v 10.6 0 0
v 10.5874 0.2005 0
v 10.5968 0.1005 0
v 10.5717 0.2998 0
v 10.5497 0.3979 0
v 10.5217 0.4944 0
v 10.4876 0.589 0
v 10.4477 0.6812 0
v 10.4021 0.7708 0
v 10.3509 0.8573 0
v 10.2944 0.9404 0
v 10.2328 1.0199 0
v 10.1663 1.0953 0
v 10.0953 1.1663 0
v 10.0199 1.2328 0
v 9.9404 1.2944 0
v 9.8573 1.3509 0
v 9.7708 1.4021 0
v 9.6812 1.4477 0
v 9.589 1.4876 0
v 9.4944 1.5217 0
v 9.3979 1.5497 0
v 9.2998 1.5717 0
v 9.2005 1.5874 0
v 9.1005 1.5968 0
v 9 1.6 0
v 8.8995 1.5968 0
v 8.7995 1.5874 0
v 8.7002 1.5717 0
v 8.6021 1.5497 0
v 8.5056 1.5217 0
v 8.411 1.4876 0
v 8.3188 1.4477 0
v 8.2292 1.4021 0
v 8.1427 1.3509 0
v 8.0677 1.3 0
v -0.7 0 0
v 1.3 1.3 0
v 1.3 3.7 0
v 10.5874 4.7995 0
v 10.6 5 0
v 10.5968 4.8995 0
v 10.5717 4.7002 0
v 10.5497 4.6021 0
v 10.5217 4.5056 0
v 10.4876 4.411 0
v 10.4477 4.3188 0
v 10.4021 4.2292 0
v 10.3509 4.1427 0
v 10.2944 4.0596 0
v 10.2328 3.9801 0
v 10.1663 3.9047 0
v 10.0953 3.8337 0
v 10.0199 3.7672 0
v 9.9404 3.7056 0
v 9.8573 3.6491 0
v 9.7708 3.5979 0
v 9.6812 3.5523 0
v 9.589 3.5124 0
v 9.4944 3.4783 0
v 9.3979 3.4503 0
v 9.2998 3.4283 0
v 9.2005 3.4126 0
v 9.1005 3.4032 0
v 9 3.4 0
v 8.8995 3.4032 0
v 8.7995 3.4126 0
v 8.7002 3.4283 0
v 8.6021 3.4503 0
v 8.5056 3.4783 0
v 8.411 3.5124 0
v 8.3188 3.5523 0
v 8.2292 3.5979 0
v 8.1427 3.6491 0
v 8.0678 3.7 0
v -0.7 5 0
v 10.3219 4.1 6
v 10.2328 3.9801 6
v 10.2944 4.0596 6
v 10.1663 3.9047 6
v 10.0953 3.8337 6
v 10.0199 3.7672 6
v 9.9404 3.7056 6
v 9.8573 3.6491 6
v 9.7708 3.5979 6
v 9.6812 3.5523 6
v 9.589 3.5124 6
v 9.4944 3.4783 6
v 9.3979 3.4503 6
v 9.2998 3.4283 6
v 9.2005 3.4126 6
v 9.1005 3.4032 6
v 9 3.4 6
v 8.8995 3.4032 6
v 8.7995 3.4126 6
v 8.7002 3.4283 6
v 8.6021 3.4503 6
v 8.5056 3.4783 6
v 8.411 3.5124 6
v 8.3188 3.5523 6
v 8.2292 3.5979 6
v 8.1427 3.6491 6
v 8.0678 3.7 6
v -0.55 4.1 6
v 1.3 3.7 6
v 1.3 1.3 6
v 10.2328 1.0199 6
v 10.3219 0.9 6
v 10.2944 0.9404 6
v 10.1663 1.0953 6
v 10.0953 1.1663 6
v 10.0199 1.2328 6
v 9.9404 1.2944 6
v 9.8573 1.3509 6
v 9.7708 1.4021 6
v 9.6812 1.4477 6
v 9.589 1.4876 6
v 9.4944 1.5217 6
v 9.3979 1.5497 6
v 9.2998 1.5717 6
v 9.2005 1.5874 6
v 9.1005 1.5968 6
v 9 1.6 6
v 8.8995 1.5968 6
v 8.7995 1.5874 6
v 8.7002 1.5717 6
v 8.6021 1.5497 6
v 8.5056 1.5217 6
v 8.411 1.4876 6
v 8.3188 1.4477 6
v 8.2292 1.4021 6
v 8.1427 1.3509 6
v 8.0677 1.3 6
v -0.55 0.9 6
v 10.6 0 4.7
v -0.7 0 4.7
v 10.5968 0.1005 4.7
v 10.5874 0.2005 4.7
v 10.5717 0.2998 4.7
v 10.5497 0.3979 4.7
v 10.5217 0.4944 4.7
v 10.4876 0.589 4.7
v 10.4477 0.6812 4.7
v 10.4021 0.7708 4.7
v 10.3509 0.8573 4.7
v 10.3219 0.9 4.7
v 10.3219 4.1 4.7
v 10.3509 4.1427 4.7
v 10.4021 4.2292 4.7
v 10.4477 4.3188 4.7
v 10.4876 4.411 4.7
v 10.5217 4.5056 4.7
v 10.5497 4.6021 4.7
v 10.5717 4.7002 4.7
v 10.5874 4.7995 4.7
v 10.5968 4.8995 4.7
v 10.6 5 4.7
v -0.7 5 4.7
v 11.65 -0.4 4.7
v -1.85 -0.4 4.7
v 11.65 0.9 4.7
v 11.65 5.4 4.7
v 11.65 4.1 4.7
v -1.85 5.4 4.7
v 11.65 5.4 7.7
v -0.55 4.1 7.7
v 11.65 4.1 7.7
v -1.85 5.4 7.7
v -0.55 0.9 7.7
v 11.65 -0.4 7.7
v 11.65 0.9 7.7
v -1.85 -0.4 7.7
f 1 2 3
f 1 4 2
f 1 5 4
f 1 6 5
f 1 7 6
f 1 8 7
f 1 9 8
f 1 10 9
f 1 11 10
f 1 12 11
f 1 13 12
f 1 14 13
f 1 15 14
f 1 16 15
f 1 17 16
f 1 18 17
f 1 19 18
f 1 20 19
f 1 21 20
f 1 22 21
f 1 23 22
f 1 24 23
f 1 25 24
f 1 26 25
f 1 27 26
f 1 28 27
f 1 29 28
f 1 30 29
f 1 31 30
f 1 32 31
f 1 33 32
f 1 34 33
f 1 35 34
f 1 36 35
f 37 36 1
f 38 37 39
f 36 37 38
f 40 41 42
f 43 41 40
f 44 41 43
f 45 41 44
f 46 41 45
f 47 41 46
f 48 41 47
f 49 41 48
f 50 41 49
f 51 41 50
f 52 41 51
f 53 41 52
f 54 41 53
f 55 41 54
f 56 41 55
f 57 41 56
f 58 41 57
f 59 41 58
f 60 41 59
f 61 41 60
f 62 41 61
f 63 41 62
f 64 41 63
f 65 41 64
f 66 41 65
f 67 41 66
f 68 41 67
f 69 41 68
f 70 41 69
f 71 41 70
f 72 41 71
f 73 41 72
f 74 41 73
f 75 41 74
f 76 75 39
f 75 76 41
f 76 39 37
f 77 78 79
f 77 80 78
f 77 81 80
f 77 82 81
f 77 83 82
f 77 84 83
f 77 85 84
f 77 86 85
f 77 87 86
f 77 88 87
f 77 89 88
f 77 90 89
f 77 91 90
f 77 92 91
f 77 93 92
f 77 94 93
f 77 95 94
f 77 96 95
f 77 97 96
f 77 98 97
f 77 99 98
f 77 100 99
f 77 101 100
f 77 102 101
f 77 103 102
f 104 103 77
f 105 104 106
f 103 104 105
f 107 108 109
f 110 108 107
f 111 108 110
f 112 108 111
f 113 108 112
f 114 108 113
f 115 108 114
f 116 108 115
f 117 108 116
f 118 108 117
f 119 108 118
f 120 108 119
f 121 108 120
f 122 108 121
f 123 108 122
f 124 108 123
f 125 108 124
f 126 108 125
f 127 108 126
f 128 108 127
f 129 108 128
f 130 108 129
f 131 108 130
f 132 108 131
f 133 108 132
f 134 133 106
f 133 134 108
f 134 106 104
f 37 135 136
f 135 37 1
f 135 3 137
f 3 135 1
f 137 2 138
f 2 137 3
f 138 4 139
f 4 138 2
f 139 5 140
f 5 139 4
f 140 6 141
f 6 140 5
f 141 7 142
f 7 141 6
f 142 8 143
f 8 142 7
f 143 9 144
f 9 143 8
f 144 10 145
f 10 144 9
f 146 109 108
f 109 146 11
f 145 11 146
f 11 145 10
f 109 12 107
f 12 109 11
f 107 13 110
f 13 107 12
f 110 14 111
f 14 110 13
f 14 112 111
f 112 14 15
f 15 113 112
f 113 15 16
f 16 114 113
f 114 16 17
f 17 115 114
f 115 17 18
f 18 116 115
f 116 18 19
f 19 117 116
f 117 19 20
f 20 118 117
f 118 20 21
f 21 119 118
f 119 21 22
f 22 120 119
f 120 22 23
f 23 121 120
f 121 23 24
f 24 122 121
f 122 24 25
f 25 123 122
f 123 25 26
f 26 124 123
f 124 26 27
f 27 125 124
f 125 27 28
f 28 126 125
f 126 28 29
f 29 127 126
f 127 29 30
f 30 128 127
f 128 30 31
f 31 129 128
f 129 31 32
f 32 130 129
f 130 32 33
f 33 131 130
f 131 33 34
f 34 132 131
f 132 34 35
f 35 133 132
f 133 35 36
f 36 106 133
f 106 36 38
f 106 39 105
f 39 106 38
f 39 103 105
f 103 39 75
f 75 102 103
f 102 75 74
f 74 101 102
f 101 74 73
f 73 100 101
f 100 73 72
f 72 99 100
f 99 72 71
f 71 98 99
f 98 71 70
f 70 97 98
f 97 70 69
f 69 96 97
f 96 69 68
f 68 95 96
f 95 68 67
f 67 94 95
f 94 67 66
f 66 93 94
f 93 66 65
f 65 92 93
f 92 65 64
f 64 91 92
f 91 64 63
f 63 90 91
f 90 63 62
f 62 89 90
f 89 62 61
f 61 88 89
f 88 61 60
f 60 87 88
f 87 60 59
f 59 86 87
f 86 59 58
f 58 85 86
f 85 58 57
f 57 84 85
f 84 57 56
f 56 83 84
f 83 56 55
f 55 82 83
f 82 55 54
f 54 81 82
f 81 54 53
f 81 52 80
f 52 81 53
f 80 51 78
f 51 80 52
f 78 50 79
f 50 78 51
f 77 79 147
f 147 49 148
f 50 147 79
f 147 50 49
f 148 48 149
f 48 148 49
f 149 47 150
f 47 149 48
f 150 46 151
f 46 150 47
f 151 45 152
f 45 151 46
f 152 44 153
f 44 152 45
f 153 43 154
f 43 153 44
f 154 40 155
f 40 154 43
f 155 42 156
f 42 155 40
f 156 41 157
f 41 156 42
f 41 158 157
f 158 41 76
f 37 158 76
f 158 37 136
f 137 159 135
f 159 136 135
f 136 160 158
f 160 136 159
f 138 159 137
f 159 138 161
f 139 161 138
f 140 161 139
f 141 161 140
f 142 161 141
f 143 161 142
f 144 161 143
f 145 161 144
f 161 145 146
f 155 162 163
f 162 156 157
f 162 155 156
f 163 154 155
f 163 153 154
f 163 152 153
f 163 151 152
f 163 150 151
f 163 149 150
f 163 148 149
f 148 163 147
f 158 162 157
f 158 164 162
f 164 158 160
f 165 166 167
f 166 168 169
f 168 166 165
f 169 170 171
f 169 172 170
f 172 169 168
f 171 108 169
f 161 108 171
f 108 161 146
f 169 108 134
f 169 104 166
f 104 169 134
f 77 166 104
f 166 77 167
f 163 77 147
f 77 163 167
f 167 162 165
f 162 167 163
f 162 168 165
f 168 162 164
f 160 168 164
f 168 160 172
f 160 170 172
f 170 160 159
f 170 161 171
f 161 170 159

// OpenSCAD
$fn=100;

w = 7.2;
l = 2.4;
t = 1.3;
h = 6;



clip(h,t,2);
translate([0,0,h-t])
    lip_s(3);


module clip(h,t,t2) {
    linear_extrude(height=h) {
        difference() {
            translate([t-t2,0,0])
                square([w+t2, l+ (2*t)]);
            translate([t,t])
                square([w,l]);
        }
        
        translate([w+t+0.5,0,0])
            semi(t+0.3);
        
        translate([w+t+0.5,l+(2*t),0])
            rotate([0,0,180])
                semi(t+0.3);
    }
}

module semi(r) {
    difference() {
        circle(r);
        translate([-r,-r,0])
            square([2*r,r]);
    }
}

module lip_s(h) {
    
    x=10.9;
    y=3.2;
    
    hx = t - (x-w)/2;
    hy = t - (y-l)/2;
    linear_extrude(height=h) {
        difference() {
            translate([hx-t,hy-t,0])
                square([x+(2*t), y+(2*t)]);
            translate([hx,hy,0])
                square([x+t,y]);
        }
    }
}
module lip_c(h) {
    
}
